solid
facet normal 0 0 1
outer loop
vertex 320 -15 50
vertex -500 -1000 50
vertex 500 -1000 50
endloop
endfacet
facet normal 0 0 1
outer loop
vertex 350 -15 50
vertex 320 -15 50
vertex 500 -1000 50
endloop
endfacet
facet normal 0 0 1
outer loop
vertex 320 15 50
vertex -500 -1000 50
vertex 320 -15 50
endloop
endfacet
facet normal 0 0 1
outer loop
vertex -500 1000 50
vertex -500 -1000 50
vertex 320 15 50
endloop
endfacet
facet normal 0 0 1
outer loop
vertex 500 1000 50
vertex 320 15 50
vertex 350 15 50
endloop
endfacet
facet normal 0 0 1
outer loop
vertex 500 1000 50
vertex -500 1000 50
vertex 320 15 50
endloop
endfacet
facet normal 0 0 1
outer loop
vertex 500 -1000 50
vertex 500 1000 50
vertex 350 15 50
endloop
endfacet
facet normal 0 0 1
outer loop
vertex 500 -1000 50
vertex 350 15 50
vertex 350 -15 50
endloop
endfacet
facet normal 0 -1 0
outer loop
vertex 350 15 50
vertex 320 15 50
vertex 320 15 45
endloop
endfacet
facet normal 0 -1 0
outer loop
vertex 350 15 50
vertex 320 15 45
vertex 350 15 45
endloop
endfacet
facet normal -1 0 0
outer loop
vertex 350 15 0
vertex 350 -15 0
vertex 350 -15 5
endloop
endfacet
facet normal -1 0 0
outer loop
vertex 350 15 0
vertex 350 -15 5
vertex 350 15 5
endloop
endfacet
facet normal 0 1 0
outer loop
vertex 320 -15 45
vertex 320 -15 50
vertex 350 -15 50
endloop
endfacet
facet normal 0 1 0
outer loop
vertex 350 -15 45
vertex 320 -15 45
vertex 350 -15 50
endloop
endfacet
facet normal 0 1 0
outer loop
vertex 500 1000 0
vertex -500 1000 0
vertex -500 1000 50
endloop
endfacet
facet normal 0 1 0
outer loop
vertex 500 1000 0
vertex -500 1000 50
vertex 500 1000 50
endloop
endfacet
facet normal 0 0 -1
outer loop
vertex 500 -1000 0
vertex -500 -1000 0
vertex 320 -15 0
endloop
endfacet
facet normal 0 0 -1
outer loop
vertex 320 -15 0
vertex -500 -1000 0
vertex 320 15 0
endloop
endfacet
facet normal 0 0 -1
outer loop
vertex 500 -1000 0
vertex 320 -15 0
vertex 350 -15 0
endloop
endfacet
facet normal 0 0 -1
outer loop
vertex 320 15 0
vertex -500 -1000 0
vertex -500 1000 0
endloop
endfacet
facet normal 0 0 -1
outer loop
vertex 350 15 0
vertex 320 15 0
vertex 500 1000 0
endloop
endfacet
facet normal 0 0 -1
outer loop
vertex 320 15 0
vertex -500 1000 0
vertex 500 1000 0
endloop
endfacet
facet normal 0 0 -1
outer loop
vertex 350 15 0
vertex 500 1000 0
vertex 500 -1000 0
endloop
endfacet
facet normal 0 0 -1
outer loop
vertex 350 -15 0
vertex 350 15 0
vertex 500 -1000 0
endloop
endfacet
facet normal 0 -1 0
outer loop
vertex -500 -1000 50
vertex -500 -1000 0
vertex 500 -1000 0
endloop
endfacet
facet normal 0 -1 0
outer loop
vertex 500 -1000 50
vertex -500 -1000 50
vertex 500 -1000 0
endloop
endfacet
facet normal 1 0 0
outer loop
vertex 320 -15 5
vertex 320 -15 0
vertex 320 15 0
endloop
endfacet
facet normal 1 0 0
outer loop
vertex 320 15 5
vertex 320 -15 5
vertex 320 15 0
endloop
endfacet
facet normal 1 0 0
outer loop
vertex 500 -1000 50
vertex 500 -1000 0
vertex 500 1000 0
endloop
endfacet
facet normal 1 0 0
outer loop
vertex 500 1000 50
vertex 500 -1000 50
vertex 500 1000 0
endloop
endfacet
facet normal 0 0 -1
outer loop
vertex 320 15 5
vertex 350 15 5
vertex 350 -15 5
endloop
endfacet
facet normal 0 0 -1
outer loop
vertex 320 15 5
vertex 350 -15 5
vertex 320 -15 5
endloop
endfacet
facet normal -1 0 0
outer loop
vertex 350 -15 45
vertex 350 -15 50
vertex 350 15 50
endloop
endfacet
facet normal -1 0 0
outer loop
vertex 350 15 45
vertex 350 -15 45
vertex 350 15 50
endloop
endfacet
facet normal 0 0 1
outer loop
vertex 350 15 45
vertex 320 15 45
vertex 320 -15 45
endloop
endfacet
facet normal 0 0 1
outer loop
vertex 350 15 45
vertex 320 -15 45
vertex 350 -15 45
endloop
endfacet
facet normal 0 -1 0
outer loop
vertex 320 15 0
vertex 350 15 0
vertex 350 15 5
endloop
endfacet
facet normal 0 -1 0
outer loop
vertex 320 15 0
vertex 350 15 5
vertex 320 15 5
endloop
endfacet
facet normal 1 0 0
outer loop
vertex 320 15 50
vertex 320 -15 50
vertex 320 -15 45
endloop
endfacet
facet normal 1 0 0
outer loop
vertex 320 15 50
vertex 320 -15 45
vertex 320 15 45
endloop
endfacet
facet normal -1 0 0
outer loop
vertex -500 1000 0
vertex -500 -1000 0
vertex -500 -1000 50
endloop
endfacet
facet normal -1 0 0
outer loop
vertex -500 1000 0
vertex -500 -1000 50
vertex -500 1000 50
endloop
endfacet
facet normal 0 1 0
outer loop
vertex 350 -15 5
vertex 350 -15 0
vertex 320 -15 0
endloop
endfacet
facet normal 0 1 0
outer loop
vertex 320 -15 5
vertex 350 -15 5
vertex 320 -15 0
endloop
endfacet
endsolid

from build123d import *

# Parameters (mm, degrees)
SKETCH1_W           = 1000
SKETCH1_H           = 2000
BOSS_EXTRUDE1_DEPTH = 50
SKETCH2_W           = 30
SKETCH2_H           = 30
CUT_EXTRUDE1_DEPTH  = 5
SKETCH3_W           = 30
SKETCH3_H           = 30
CUT_EXTRUDE2_DEPTH  = 5


with BuildPart() as part:
    # Sketch1 → Boss-Extrude1 (new body)
    with BuildSketch(Plane.XY):
        Rectangle(SKETCH1_W, SKETCH1_H)
    extrude(amount=BOSS_EXTRUDE1_DEPTH)

    # Sketch2 → Cut-Extrude1 (cut)
    with BuildSketch(Plane.XY.offset(50)):
        with Locations((335, 0)):
            Rectangle(SKETCH2_W, SKETCH2_H)
    extrude(amount=-CUT_EXTRUDE1_DEPTH, mode=Mode.SUBTRACT)

    # Sketch3 → Cut-Extrude2 (cut)
    with BuildSketch(Plane(origin=(0, 0, 0), x_dir=(-1, 0, 0), z_dir=(0, 0, -1))):
        with Locations((-335, 0)):
            Rectangle(SKETCH3_W, SKETCH3_H)
    extrude(amount=-CUT_EXTRUDE2_DEPTH, mode=Mode.SUBTRACT)


solid = part.part
